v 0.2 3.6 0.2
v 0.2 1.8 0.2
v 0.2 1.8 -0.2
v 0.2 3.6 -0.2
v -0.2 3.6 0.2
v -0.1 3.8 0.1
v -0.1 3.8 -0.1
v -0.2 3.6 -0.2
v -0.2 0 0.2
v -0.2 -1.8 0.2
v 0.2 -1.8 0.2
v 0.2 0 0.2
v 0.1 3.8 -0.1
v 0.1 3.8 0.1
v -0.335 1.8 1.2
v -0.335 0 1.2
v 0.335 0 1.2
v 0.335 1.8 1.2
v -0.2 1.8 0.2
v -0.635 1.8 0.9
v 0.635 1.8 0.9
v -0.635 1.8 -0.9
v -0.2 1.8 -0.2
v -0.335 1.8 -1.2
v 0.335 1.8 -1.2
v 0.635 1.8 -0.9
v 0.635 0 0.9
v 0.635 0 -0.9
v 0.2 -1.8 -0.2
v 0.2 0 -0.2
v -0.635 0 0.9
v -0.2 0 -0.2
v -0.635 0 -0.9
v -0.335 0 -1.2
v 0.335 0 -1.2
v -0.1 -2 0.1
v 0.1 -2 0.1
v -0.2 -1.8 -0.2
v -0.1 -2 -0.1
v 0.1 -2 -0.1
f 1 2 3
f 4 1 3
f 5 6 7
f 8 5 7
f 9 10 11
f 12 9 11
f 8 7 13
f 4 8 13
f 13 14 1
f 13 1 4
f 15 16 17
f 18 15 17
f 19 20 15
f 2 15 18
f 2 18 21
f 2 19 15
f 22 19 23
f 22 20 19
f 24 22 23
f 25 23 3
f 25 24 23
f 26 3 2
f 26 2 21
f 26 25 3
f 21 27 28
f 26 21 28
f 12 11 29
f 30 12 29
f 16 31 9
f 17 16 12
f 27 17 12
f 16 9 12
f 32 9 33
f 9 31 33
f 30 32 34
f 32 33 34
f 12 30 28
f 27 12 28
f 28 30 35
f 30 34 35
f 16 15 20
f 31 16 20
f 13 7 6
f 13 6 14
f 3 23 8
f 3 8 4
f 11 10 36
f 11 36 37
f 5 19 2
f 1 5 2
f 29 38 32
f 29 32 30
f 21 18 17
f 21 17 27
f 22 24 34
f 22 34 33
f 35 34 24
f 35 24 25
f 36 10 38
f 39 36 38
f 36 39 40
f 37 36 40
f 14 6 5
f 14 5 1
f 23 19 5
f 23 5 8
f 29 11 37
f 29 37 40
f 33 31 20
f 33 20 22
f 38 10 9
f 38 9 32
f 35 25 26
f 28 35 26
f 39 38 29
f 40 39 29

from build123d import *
from OCP.BRepFilletAPI import BRepFilletAPI_MakeChamfer

# Parameters (mm, degrees)
SKETCH_1_W           = 1.27
SKETCH_1_H           = 2.4
EXTRUDE_1_DEPTH      = 1.8
EXTRUDE_2_DEPTH      = 2
EXTRUDE_2_DEPTH_BACK = 3.8
SKETCH_2_W           = 0.4
SKETCH_2_H           = 0.4
CUT_EXTRUDE_1_DEPTH  = 5.035247824
CHAMFER_1_SIZE       = 0.2
CHAMFER_1_SIZE2      = 0.1
CHAMFER_2_SIZE       = 0.1
CHAMFER_2_SIZE2      = 0.2


with BuildPart() as part:
    # 草图1 → 凸台-拉伸1 (new body)
    with BuildSketch(Plane(origin=(0, 0, 0), x_dir=(1, 0, 0), z_dir=(0, 1, 0))):
        Rectangle(SKETCH_1_W, SKETCH_1_H)
    extrude(amount=EXTRUDE_1_DEPTH)

    # 草图2 → 凸台-拉伸2 (add, two sides: drawn at the far end of the back side and taken through both)
    with BuildSketch(Plane(origin=(0, 1.8, 0), x_dir=(1, 0, 0), z_dir=(0, 1, 0)).offset(-EXTRUDE_2_DEPTH_BACK)):
        Rectangle(SKETCH_2_W, SKETCH_2_H)
    extrude(amount=EXTRUDE_2_DEPTH + EXTRUDE_2_DEPTH_BACK)

    # 草图3 → 切除-拉伸1 (cut, through all)
    with BuildSketch(Plane(origin=(0, 1.8, 0), x_dir=(1, 0, 0), z_dir=(0, 1, 0))):
        Polygon((-0.335, 1.2), (-0.635, 0.9), (-0.635, 1.2), align=None)
        Polygon((0.635, 1.2), (0.335, 1.2), (0.635, 0.9), align=None)
        Polygon((0.335, -1.2), (0.635, -0.9), (0.635, -1.2), align=None)
        Polygon((-0.635, -1.2), (-0.335, -1.2), (-0.635, -0.9), align=None)
    extrude(amount=-CUT_EXTRUDE_1_DEPTH, mode=Mode.SUBTRACT)

    # 倒角1: one chamfer whose edges measure the first distance from different faces: ONE call of the kernel's chamfer builder (chamfer() names one face for all edges)
    chamfer_1_edges_1 = [part.edges().sort_by_distance(p)[0] for p in [
        (0.2, 3.8, 0),
    ]]
    chamfer_1_side_1 = [part.faces().sort_by_distance(p)[0] for p in [
        (0.2, 2.8, 0),
    ]]
    chamfer_1_edges_2 = [part.edges().sort_by_distance(p)[0] for p in [
        (0, 3.8, -0.2),
    ]]
    chamfer_1_side_2 = [part.faces().sort_by_distance(p)[0] for p in [
        (0, 2.8, -0.2),
    ]]
    chamfer_1_edges_3 = [part.edges().sort_by_distance(p)[0] for p in [
        (-0.2, 3.8, 0),
    ]]
    chamfer_1_side_3 = [part.faces().sort_by_distance(p)[0] for p in [
        (-0.2, 2.8, 0),
    ]]
    chamfer_1_edges_4 = [part.edges().sort_by_distance(p)[0] for p in [
        (0, 3.8, 0.2),
    ]]
    chamfer_1_side_4 = [part.faces().sort_by_distance(p)[0] for p in [
        (0, 2.8, 0.2),
    ]]
    chamfer_1 = BRepFilletAPI_MakeChamfer(part.part.solid().wrapped)
    for e in chamfer_1_edges_1:
        chamfer_1.Add(CHAMFER_1_SIZE, CHAMFER_1_SIZE2, e.wrapped, chamfer_1_side_1[0].wrapped)  # the first distance lies on this face
    for e in chamfer_1_edges_2:
        chamfer_1.Add(CHAMFER_1_SIZE, CHAMFER_1_SIZE2, e.wrapped, chamfer_1_side_2[0].wrapped)  # the first distance lies on this face
    for e in chamfer_1_edges_3:
        chamfer_1.Add(CHAMFER_1_SIZE, CHAMFER_1_SIZE2, e.wrapped, chamfer_1_side_3[0].wrapped)  # the first distance lies on this face
    for e in chamfer_1_edges_4:
        chamfer_1.Add(CHAMFER_1_SIZE, CHAMFER_1_SIZE2, e.wrapped, chamfer_1_side_4[0].wrapped)  # the first distance lies on this face
    add(Compound.cast(chamfer_1.Shape()), mode=Mode.REPLACE)

    # 倒角2
    chamfer_2_edges = [part.edges().sort_by_distance(p)[0] for p in [
        (0.2, -2, 0),
        (0, -2, 0.2),
        (-0.2, -2, 0),
        (0, -2, -0.2),
    ]]
    chamfer_2_side = [part.faces().sort_by_distance(p)[0] for p in [
        (0, -2, 0),
    ]]
    chamfer(chamfer_2_edges, length=CHAMFER_2_SIZE, length2=CHAMFER_2_SIZE2, reference=chamfer_2_side[0])


solid = part.part
